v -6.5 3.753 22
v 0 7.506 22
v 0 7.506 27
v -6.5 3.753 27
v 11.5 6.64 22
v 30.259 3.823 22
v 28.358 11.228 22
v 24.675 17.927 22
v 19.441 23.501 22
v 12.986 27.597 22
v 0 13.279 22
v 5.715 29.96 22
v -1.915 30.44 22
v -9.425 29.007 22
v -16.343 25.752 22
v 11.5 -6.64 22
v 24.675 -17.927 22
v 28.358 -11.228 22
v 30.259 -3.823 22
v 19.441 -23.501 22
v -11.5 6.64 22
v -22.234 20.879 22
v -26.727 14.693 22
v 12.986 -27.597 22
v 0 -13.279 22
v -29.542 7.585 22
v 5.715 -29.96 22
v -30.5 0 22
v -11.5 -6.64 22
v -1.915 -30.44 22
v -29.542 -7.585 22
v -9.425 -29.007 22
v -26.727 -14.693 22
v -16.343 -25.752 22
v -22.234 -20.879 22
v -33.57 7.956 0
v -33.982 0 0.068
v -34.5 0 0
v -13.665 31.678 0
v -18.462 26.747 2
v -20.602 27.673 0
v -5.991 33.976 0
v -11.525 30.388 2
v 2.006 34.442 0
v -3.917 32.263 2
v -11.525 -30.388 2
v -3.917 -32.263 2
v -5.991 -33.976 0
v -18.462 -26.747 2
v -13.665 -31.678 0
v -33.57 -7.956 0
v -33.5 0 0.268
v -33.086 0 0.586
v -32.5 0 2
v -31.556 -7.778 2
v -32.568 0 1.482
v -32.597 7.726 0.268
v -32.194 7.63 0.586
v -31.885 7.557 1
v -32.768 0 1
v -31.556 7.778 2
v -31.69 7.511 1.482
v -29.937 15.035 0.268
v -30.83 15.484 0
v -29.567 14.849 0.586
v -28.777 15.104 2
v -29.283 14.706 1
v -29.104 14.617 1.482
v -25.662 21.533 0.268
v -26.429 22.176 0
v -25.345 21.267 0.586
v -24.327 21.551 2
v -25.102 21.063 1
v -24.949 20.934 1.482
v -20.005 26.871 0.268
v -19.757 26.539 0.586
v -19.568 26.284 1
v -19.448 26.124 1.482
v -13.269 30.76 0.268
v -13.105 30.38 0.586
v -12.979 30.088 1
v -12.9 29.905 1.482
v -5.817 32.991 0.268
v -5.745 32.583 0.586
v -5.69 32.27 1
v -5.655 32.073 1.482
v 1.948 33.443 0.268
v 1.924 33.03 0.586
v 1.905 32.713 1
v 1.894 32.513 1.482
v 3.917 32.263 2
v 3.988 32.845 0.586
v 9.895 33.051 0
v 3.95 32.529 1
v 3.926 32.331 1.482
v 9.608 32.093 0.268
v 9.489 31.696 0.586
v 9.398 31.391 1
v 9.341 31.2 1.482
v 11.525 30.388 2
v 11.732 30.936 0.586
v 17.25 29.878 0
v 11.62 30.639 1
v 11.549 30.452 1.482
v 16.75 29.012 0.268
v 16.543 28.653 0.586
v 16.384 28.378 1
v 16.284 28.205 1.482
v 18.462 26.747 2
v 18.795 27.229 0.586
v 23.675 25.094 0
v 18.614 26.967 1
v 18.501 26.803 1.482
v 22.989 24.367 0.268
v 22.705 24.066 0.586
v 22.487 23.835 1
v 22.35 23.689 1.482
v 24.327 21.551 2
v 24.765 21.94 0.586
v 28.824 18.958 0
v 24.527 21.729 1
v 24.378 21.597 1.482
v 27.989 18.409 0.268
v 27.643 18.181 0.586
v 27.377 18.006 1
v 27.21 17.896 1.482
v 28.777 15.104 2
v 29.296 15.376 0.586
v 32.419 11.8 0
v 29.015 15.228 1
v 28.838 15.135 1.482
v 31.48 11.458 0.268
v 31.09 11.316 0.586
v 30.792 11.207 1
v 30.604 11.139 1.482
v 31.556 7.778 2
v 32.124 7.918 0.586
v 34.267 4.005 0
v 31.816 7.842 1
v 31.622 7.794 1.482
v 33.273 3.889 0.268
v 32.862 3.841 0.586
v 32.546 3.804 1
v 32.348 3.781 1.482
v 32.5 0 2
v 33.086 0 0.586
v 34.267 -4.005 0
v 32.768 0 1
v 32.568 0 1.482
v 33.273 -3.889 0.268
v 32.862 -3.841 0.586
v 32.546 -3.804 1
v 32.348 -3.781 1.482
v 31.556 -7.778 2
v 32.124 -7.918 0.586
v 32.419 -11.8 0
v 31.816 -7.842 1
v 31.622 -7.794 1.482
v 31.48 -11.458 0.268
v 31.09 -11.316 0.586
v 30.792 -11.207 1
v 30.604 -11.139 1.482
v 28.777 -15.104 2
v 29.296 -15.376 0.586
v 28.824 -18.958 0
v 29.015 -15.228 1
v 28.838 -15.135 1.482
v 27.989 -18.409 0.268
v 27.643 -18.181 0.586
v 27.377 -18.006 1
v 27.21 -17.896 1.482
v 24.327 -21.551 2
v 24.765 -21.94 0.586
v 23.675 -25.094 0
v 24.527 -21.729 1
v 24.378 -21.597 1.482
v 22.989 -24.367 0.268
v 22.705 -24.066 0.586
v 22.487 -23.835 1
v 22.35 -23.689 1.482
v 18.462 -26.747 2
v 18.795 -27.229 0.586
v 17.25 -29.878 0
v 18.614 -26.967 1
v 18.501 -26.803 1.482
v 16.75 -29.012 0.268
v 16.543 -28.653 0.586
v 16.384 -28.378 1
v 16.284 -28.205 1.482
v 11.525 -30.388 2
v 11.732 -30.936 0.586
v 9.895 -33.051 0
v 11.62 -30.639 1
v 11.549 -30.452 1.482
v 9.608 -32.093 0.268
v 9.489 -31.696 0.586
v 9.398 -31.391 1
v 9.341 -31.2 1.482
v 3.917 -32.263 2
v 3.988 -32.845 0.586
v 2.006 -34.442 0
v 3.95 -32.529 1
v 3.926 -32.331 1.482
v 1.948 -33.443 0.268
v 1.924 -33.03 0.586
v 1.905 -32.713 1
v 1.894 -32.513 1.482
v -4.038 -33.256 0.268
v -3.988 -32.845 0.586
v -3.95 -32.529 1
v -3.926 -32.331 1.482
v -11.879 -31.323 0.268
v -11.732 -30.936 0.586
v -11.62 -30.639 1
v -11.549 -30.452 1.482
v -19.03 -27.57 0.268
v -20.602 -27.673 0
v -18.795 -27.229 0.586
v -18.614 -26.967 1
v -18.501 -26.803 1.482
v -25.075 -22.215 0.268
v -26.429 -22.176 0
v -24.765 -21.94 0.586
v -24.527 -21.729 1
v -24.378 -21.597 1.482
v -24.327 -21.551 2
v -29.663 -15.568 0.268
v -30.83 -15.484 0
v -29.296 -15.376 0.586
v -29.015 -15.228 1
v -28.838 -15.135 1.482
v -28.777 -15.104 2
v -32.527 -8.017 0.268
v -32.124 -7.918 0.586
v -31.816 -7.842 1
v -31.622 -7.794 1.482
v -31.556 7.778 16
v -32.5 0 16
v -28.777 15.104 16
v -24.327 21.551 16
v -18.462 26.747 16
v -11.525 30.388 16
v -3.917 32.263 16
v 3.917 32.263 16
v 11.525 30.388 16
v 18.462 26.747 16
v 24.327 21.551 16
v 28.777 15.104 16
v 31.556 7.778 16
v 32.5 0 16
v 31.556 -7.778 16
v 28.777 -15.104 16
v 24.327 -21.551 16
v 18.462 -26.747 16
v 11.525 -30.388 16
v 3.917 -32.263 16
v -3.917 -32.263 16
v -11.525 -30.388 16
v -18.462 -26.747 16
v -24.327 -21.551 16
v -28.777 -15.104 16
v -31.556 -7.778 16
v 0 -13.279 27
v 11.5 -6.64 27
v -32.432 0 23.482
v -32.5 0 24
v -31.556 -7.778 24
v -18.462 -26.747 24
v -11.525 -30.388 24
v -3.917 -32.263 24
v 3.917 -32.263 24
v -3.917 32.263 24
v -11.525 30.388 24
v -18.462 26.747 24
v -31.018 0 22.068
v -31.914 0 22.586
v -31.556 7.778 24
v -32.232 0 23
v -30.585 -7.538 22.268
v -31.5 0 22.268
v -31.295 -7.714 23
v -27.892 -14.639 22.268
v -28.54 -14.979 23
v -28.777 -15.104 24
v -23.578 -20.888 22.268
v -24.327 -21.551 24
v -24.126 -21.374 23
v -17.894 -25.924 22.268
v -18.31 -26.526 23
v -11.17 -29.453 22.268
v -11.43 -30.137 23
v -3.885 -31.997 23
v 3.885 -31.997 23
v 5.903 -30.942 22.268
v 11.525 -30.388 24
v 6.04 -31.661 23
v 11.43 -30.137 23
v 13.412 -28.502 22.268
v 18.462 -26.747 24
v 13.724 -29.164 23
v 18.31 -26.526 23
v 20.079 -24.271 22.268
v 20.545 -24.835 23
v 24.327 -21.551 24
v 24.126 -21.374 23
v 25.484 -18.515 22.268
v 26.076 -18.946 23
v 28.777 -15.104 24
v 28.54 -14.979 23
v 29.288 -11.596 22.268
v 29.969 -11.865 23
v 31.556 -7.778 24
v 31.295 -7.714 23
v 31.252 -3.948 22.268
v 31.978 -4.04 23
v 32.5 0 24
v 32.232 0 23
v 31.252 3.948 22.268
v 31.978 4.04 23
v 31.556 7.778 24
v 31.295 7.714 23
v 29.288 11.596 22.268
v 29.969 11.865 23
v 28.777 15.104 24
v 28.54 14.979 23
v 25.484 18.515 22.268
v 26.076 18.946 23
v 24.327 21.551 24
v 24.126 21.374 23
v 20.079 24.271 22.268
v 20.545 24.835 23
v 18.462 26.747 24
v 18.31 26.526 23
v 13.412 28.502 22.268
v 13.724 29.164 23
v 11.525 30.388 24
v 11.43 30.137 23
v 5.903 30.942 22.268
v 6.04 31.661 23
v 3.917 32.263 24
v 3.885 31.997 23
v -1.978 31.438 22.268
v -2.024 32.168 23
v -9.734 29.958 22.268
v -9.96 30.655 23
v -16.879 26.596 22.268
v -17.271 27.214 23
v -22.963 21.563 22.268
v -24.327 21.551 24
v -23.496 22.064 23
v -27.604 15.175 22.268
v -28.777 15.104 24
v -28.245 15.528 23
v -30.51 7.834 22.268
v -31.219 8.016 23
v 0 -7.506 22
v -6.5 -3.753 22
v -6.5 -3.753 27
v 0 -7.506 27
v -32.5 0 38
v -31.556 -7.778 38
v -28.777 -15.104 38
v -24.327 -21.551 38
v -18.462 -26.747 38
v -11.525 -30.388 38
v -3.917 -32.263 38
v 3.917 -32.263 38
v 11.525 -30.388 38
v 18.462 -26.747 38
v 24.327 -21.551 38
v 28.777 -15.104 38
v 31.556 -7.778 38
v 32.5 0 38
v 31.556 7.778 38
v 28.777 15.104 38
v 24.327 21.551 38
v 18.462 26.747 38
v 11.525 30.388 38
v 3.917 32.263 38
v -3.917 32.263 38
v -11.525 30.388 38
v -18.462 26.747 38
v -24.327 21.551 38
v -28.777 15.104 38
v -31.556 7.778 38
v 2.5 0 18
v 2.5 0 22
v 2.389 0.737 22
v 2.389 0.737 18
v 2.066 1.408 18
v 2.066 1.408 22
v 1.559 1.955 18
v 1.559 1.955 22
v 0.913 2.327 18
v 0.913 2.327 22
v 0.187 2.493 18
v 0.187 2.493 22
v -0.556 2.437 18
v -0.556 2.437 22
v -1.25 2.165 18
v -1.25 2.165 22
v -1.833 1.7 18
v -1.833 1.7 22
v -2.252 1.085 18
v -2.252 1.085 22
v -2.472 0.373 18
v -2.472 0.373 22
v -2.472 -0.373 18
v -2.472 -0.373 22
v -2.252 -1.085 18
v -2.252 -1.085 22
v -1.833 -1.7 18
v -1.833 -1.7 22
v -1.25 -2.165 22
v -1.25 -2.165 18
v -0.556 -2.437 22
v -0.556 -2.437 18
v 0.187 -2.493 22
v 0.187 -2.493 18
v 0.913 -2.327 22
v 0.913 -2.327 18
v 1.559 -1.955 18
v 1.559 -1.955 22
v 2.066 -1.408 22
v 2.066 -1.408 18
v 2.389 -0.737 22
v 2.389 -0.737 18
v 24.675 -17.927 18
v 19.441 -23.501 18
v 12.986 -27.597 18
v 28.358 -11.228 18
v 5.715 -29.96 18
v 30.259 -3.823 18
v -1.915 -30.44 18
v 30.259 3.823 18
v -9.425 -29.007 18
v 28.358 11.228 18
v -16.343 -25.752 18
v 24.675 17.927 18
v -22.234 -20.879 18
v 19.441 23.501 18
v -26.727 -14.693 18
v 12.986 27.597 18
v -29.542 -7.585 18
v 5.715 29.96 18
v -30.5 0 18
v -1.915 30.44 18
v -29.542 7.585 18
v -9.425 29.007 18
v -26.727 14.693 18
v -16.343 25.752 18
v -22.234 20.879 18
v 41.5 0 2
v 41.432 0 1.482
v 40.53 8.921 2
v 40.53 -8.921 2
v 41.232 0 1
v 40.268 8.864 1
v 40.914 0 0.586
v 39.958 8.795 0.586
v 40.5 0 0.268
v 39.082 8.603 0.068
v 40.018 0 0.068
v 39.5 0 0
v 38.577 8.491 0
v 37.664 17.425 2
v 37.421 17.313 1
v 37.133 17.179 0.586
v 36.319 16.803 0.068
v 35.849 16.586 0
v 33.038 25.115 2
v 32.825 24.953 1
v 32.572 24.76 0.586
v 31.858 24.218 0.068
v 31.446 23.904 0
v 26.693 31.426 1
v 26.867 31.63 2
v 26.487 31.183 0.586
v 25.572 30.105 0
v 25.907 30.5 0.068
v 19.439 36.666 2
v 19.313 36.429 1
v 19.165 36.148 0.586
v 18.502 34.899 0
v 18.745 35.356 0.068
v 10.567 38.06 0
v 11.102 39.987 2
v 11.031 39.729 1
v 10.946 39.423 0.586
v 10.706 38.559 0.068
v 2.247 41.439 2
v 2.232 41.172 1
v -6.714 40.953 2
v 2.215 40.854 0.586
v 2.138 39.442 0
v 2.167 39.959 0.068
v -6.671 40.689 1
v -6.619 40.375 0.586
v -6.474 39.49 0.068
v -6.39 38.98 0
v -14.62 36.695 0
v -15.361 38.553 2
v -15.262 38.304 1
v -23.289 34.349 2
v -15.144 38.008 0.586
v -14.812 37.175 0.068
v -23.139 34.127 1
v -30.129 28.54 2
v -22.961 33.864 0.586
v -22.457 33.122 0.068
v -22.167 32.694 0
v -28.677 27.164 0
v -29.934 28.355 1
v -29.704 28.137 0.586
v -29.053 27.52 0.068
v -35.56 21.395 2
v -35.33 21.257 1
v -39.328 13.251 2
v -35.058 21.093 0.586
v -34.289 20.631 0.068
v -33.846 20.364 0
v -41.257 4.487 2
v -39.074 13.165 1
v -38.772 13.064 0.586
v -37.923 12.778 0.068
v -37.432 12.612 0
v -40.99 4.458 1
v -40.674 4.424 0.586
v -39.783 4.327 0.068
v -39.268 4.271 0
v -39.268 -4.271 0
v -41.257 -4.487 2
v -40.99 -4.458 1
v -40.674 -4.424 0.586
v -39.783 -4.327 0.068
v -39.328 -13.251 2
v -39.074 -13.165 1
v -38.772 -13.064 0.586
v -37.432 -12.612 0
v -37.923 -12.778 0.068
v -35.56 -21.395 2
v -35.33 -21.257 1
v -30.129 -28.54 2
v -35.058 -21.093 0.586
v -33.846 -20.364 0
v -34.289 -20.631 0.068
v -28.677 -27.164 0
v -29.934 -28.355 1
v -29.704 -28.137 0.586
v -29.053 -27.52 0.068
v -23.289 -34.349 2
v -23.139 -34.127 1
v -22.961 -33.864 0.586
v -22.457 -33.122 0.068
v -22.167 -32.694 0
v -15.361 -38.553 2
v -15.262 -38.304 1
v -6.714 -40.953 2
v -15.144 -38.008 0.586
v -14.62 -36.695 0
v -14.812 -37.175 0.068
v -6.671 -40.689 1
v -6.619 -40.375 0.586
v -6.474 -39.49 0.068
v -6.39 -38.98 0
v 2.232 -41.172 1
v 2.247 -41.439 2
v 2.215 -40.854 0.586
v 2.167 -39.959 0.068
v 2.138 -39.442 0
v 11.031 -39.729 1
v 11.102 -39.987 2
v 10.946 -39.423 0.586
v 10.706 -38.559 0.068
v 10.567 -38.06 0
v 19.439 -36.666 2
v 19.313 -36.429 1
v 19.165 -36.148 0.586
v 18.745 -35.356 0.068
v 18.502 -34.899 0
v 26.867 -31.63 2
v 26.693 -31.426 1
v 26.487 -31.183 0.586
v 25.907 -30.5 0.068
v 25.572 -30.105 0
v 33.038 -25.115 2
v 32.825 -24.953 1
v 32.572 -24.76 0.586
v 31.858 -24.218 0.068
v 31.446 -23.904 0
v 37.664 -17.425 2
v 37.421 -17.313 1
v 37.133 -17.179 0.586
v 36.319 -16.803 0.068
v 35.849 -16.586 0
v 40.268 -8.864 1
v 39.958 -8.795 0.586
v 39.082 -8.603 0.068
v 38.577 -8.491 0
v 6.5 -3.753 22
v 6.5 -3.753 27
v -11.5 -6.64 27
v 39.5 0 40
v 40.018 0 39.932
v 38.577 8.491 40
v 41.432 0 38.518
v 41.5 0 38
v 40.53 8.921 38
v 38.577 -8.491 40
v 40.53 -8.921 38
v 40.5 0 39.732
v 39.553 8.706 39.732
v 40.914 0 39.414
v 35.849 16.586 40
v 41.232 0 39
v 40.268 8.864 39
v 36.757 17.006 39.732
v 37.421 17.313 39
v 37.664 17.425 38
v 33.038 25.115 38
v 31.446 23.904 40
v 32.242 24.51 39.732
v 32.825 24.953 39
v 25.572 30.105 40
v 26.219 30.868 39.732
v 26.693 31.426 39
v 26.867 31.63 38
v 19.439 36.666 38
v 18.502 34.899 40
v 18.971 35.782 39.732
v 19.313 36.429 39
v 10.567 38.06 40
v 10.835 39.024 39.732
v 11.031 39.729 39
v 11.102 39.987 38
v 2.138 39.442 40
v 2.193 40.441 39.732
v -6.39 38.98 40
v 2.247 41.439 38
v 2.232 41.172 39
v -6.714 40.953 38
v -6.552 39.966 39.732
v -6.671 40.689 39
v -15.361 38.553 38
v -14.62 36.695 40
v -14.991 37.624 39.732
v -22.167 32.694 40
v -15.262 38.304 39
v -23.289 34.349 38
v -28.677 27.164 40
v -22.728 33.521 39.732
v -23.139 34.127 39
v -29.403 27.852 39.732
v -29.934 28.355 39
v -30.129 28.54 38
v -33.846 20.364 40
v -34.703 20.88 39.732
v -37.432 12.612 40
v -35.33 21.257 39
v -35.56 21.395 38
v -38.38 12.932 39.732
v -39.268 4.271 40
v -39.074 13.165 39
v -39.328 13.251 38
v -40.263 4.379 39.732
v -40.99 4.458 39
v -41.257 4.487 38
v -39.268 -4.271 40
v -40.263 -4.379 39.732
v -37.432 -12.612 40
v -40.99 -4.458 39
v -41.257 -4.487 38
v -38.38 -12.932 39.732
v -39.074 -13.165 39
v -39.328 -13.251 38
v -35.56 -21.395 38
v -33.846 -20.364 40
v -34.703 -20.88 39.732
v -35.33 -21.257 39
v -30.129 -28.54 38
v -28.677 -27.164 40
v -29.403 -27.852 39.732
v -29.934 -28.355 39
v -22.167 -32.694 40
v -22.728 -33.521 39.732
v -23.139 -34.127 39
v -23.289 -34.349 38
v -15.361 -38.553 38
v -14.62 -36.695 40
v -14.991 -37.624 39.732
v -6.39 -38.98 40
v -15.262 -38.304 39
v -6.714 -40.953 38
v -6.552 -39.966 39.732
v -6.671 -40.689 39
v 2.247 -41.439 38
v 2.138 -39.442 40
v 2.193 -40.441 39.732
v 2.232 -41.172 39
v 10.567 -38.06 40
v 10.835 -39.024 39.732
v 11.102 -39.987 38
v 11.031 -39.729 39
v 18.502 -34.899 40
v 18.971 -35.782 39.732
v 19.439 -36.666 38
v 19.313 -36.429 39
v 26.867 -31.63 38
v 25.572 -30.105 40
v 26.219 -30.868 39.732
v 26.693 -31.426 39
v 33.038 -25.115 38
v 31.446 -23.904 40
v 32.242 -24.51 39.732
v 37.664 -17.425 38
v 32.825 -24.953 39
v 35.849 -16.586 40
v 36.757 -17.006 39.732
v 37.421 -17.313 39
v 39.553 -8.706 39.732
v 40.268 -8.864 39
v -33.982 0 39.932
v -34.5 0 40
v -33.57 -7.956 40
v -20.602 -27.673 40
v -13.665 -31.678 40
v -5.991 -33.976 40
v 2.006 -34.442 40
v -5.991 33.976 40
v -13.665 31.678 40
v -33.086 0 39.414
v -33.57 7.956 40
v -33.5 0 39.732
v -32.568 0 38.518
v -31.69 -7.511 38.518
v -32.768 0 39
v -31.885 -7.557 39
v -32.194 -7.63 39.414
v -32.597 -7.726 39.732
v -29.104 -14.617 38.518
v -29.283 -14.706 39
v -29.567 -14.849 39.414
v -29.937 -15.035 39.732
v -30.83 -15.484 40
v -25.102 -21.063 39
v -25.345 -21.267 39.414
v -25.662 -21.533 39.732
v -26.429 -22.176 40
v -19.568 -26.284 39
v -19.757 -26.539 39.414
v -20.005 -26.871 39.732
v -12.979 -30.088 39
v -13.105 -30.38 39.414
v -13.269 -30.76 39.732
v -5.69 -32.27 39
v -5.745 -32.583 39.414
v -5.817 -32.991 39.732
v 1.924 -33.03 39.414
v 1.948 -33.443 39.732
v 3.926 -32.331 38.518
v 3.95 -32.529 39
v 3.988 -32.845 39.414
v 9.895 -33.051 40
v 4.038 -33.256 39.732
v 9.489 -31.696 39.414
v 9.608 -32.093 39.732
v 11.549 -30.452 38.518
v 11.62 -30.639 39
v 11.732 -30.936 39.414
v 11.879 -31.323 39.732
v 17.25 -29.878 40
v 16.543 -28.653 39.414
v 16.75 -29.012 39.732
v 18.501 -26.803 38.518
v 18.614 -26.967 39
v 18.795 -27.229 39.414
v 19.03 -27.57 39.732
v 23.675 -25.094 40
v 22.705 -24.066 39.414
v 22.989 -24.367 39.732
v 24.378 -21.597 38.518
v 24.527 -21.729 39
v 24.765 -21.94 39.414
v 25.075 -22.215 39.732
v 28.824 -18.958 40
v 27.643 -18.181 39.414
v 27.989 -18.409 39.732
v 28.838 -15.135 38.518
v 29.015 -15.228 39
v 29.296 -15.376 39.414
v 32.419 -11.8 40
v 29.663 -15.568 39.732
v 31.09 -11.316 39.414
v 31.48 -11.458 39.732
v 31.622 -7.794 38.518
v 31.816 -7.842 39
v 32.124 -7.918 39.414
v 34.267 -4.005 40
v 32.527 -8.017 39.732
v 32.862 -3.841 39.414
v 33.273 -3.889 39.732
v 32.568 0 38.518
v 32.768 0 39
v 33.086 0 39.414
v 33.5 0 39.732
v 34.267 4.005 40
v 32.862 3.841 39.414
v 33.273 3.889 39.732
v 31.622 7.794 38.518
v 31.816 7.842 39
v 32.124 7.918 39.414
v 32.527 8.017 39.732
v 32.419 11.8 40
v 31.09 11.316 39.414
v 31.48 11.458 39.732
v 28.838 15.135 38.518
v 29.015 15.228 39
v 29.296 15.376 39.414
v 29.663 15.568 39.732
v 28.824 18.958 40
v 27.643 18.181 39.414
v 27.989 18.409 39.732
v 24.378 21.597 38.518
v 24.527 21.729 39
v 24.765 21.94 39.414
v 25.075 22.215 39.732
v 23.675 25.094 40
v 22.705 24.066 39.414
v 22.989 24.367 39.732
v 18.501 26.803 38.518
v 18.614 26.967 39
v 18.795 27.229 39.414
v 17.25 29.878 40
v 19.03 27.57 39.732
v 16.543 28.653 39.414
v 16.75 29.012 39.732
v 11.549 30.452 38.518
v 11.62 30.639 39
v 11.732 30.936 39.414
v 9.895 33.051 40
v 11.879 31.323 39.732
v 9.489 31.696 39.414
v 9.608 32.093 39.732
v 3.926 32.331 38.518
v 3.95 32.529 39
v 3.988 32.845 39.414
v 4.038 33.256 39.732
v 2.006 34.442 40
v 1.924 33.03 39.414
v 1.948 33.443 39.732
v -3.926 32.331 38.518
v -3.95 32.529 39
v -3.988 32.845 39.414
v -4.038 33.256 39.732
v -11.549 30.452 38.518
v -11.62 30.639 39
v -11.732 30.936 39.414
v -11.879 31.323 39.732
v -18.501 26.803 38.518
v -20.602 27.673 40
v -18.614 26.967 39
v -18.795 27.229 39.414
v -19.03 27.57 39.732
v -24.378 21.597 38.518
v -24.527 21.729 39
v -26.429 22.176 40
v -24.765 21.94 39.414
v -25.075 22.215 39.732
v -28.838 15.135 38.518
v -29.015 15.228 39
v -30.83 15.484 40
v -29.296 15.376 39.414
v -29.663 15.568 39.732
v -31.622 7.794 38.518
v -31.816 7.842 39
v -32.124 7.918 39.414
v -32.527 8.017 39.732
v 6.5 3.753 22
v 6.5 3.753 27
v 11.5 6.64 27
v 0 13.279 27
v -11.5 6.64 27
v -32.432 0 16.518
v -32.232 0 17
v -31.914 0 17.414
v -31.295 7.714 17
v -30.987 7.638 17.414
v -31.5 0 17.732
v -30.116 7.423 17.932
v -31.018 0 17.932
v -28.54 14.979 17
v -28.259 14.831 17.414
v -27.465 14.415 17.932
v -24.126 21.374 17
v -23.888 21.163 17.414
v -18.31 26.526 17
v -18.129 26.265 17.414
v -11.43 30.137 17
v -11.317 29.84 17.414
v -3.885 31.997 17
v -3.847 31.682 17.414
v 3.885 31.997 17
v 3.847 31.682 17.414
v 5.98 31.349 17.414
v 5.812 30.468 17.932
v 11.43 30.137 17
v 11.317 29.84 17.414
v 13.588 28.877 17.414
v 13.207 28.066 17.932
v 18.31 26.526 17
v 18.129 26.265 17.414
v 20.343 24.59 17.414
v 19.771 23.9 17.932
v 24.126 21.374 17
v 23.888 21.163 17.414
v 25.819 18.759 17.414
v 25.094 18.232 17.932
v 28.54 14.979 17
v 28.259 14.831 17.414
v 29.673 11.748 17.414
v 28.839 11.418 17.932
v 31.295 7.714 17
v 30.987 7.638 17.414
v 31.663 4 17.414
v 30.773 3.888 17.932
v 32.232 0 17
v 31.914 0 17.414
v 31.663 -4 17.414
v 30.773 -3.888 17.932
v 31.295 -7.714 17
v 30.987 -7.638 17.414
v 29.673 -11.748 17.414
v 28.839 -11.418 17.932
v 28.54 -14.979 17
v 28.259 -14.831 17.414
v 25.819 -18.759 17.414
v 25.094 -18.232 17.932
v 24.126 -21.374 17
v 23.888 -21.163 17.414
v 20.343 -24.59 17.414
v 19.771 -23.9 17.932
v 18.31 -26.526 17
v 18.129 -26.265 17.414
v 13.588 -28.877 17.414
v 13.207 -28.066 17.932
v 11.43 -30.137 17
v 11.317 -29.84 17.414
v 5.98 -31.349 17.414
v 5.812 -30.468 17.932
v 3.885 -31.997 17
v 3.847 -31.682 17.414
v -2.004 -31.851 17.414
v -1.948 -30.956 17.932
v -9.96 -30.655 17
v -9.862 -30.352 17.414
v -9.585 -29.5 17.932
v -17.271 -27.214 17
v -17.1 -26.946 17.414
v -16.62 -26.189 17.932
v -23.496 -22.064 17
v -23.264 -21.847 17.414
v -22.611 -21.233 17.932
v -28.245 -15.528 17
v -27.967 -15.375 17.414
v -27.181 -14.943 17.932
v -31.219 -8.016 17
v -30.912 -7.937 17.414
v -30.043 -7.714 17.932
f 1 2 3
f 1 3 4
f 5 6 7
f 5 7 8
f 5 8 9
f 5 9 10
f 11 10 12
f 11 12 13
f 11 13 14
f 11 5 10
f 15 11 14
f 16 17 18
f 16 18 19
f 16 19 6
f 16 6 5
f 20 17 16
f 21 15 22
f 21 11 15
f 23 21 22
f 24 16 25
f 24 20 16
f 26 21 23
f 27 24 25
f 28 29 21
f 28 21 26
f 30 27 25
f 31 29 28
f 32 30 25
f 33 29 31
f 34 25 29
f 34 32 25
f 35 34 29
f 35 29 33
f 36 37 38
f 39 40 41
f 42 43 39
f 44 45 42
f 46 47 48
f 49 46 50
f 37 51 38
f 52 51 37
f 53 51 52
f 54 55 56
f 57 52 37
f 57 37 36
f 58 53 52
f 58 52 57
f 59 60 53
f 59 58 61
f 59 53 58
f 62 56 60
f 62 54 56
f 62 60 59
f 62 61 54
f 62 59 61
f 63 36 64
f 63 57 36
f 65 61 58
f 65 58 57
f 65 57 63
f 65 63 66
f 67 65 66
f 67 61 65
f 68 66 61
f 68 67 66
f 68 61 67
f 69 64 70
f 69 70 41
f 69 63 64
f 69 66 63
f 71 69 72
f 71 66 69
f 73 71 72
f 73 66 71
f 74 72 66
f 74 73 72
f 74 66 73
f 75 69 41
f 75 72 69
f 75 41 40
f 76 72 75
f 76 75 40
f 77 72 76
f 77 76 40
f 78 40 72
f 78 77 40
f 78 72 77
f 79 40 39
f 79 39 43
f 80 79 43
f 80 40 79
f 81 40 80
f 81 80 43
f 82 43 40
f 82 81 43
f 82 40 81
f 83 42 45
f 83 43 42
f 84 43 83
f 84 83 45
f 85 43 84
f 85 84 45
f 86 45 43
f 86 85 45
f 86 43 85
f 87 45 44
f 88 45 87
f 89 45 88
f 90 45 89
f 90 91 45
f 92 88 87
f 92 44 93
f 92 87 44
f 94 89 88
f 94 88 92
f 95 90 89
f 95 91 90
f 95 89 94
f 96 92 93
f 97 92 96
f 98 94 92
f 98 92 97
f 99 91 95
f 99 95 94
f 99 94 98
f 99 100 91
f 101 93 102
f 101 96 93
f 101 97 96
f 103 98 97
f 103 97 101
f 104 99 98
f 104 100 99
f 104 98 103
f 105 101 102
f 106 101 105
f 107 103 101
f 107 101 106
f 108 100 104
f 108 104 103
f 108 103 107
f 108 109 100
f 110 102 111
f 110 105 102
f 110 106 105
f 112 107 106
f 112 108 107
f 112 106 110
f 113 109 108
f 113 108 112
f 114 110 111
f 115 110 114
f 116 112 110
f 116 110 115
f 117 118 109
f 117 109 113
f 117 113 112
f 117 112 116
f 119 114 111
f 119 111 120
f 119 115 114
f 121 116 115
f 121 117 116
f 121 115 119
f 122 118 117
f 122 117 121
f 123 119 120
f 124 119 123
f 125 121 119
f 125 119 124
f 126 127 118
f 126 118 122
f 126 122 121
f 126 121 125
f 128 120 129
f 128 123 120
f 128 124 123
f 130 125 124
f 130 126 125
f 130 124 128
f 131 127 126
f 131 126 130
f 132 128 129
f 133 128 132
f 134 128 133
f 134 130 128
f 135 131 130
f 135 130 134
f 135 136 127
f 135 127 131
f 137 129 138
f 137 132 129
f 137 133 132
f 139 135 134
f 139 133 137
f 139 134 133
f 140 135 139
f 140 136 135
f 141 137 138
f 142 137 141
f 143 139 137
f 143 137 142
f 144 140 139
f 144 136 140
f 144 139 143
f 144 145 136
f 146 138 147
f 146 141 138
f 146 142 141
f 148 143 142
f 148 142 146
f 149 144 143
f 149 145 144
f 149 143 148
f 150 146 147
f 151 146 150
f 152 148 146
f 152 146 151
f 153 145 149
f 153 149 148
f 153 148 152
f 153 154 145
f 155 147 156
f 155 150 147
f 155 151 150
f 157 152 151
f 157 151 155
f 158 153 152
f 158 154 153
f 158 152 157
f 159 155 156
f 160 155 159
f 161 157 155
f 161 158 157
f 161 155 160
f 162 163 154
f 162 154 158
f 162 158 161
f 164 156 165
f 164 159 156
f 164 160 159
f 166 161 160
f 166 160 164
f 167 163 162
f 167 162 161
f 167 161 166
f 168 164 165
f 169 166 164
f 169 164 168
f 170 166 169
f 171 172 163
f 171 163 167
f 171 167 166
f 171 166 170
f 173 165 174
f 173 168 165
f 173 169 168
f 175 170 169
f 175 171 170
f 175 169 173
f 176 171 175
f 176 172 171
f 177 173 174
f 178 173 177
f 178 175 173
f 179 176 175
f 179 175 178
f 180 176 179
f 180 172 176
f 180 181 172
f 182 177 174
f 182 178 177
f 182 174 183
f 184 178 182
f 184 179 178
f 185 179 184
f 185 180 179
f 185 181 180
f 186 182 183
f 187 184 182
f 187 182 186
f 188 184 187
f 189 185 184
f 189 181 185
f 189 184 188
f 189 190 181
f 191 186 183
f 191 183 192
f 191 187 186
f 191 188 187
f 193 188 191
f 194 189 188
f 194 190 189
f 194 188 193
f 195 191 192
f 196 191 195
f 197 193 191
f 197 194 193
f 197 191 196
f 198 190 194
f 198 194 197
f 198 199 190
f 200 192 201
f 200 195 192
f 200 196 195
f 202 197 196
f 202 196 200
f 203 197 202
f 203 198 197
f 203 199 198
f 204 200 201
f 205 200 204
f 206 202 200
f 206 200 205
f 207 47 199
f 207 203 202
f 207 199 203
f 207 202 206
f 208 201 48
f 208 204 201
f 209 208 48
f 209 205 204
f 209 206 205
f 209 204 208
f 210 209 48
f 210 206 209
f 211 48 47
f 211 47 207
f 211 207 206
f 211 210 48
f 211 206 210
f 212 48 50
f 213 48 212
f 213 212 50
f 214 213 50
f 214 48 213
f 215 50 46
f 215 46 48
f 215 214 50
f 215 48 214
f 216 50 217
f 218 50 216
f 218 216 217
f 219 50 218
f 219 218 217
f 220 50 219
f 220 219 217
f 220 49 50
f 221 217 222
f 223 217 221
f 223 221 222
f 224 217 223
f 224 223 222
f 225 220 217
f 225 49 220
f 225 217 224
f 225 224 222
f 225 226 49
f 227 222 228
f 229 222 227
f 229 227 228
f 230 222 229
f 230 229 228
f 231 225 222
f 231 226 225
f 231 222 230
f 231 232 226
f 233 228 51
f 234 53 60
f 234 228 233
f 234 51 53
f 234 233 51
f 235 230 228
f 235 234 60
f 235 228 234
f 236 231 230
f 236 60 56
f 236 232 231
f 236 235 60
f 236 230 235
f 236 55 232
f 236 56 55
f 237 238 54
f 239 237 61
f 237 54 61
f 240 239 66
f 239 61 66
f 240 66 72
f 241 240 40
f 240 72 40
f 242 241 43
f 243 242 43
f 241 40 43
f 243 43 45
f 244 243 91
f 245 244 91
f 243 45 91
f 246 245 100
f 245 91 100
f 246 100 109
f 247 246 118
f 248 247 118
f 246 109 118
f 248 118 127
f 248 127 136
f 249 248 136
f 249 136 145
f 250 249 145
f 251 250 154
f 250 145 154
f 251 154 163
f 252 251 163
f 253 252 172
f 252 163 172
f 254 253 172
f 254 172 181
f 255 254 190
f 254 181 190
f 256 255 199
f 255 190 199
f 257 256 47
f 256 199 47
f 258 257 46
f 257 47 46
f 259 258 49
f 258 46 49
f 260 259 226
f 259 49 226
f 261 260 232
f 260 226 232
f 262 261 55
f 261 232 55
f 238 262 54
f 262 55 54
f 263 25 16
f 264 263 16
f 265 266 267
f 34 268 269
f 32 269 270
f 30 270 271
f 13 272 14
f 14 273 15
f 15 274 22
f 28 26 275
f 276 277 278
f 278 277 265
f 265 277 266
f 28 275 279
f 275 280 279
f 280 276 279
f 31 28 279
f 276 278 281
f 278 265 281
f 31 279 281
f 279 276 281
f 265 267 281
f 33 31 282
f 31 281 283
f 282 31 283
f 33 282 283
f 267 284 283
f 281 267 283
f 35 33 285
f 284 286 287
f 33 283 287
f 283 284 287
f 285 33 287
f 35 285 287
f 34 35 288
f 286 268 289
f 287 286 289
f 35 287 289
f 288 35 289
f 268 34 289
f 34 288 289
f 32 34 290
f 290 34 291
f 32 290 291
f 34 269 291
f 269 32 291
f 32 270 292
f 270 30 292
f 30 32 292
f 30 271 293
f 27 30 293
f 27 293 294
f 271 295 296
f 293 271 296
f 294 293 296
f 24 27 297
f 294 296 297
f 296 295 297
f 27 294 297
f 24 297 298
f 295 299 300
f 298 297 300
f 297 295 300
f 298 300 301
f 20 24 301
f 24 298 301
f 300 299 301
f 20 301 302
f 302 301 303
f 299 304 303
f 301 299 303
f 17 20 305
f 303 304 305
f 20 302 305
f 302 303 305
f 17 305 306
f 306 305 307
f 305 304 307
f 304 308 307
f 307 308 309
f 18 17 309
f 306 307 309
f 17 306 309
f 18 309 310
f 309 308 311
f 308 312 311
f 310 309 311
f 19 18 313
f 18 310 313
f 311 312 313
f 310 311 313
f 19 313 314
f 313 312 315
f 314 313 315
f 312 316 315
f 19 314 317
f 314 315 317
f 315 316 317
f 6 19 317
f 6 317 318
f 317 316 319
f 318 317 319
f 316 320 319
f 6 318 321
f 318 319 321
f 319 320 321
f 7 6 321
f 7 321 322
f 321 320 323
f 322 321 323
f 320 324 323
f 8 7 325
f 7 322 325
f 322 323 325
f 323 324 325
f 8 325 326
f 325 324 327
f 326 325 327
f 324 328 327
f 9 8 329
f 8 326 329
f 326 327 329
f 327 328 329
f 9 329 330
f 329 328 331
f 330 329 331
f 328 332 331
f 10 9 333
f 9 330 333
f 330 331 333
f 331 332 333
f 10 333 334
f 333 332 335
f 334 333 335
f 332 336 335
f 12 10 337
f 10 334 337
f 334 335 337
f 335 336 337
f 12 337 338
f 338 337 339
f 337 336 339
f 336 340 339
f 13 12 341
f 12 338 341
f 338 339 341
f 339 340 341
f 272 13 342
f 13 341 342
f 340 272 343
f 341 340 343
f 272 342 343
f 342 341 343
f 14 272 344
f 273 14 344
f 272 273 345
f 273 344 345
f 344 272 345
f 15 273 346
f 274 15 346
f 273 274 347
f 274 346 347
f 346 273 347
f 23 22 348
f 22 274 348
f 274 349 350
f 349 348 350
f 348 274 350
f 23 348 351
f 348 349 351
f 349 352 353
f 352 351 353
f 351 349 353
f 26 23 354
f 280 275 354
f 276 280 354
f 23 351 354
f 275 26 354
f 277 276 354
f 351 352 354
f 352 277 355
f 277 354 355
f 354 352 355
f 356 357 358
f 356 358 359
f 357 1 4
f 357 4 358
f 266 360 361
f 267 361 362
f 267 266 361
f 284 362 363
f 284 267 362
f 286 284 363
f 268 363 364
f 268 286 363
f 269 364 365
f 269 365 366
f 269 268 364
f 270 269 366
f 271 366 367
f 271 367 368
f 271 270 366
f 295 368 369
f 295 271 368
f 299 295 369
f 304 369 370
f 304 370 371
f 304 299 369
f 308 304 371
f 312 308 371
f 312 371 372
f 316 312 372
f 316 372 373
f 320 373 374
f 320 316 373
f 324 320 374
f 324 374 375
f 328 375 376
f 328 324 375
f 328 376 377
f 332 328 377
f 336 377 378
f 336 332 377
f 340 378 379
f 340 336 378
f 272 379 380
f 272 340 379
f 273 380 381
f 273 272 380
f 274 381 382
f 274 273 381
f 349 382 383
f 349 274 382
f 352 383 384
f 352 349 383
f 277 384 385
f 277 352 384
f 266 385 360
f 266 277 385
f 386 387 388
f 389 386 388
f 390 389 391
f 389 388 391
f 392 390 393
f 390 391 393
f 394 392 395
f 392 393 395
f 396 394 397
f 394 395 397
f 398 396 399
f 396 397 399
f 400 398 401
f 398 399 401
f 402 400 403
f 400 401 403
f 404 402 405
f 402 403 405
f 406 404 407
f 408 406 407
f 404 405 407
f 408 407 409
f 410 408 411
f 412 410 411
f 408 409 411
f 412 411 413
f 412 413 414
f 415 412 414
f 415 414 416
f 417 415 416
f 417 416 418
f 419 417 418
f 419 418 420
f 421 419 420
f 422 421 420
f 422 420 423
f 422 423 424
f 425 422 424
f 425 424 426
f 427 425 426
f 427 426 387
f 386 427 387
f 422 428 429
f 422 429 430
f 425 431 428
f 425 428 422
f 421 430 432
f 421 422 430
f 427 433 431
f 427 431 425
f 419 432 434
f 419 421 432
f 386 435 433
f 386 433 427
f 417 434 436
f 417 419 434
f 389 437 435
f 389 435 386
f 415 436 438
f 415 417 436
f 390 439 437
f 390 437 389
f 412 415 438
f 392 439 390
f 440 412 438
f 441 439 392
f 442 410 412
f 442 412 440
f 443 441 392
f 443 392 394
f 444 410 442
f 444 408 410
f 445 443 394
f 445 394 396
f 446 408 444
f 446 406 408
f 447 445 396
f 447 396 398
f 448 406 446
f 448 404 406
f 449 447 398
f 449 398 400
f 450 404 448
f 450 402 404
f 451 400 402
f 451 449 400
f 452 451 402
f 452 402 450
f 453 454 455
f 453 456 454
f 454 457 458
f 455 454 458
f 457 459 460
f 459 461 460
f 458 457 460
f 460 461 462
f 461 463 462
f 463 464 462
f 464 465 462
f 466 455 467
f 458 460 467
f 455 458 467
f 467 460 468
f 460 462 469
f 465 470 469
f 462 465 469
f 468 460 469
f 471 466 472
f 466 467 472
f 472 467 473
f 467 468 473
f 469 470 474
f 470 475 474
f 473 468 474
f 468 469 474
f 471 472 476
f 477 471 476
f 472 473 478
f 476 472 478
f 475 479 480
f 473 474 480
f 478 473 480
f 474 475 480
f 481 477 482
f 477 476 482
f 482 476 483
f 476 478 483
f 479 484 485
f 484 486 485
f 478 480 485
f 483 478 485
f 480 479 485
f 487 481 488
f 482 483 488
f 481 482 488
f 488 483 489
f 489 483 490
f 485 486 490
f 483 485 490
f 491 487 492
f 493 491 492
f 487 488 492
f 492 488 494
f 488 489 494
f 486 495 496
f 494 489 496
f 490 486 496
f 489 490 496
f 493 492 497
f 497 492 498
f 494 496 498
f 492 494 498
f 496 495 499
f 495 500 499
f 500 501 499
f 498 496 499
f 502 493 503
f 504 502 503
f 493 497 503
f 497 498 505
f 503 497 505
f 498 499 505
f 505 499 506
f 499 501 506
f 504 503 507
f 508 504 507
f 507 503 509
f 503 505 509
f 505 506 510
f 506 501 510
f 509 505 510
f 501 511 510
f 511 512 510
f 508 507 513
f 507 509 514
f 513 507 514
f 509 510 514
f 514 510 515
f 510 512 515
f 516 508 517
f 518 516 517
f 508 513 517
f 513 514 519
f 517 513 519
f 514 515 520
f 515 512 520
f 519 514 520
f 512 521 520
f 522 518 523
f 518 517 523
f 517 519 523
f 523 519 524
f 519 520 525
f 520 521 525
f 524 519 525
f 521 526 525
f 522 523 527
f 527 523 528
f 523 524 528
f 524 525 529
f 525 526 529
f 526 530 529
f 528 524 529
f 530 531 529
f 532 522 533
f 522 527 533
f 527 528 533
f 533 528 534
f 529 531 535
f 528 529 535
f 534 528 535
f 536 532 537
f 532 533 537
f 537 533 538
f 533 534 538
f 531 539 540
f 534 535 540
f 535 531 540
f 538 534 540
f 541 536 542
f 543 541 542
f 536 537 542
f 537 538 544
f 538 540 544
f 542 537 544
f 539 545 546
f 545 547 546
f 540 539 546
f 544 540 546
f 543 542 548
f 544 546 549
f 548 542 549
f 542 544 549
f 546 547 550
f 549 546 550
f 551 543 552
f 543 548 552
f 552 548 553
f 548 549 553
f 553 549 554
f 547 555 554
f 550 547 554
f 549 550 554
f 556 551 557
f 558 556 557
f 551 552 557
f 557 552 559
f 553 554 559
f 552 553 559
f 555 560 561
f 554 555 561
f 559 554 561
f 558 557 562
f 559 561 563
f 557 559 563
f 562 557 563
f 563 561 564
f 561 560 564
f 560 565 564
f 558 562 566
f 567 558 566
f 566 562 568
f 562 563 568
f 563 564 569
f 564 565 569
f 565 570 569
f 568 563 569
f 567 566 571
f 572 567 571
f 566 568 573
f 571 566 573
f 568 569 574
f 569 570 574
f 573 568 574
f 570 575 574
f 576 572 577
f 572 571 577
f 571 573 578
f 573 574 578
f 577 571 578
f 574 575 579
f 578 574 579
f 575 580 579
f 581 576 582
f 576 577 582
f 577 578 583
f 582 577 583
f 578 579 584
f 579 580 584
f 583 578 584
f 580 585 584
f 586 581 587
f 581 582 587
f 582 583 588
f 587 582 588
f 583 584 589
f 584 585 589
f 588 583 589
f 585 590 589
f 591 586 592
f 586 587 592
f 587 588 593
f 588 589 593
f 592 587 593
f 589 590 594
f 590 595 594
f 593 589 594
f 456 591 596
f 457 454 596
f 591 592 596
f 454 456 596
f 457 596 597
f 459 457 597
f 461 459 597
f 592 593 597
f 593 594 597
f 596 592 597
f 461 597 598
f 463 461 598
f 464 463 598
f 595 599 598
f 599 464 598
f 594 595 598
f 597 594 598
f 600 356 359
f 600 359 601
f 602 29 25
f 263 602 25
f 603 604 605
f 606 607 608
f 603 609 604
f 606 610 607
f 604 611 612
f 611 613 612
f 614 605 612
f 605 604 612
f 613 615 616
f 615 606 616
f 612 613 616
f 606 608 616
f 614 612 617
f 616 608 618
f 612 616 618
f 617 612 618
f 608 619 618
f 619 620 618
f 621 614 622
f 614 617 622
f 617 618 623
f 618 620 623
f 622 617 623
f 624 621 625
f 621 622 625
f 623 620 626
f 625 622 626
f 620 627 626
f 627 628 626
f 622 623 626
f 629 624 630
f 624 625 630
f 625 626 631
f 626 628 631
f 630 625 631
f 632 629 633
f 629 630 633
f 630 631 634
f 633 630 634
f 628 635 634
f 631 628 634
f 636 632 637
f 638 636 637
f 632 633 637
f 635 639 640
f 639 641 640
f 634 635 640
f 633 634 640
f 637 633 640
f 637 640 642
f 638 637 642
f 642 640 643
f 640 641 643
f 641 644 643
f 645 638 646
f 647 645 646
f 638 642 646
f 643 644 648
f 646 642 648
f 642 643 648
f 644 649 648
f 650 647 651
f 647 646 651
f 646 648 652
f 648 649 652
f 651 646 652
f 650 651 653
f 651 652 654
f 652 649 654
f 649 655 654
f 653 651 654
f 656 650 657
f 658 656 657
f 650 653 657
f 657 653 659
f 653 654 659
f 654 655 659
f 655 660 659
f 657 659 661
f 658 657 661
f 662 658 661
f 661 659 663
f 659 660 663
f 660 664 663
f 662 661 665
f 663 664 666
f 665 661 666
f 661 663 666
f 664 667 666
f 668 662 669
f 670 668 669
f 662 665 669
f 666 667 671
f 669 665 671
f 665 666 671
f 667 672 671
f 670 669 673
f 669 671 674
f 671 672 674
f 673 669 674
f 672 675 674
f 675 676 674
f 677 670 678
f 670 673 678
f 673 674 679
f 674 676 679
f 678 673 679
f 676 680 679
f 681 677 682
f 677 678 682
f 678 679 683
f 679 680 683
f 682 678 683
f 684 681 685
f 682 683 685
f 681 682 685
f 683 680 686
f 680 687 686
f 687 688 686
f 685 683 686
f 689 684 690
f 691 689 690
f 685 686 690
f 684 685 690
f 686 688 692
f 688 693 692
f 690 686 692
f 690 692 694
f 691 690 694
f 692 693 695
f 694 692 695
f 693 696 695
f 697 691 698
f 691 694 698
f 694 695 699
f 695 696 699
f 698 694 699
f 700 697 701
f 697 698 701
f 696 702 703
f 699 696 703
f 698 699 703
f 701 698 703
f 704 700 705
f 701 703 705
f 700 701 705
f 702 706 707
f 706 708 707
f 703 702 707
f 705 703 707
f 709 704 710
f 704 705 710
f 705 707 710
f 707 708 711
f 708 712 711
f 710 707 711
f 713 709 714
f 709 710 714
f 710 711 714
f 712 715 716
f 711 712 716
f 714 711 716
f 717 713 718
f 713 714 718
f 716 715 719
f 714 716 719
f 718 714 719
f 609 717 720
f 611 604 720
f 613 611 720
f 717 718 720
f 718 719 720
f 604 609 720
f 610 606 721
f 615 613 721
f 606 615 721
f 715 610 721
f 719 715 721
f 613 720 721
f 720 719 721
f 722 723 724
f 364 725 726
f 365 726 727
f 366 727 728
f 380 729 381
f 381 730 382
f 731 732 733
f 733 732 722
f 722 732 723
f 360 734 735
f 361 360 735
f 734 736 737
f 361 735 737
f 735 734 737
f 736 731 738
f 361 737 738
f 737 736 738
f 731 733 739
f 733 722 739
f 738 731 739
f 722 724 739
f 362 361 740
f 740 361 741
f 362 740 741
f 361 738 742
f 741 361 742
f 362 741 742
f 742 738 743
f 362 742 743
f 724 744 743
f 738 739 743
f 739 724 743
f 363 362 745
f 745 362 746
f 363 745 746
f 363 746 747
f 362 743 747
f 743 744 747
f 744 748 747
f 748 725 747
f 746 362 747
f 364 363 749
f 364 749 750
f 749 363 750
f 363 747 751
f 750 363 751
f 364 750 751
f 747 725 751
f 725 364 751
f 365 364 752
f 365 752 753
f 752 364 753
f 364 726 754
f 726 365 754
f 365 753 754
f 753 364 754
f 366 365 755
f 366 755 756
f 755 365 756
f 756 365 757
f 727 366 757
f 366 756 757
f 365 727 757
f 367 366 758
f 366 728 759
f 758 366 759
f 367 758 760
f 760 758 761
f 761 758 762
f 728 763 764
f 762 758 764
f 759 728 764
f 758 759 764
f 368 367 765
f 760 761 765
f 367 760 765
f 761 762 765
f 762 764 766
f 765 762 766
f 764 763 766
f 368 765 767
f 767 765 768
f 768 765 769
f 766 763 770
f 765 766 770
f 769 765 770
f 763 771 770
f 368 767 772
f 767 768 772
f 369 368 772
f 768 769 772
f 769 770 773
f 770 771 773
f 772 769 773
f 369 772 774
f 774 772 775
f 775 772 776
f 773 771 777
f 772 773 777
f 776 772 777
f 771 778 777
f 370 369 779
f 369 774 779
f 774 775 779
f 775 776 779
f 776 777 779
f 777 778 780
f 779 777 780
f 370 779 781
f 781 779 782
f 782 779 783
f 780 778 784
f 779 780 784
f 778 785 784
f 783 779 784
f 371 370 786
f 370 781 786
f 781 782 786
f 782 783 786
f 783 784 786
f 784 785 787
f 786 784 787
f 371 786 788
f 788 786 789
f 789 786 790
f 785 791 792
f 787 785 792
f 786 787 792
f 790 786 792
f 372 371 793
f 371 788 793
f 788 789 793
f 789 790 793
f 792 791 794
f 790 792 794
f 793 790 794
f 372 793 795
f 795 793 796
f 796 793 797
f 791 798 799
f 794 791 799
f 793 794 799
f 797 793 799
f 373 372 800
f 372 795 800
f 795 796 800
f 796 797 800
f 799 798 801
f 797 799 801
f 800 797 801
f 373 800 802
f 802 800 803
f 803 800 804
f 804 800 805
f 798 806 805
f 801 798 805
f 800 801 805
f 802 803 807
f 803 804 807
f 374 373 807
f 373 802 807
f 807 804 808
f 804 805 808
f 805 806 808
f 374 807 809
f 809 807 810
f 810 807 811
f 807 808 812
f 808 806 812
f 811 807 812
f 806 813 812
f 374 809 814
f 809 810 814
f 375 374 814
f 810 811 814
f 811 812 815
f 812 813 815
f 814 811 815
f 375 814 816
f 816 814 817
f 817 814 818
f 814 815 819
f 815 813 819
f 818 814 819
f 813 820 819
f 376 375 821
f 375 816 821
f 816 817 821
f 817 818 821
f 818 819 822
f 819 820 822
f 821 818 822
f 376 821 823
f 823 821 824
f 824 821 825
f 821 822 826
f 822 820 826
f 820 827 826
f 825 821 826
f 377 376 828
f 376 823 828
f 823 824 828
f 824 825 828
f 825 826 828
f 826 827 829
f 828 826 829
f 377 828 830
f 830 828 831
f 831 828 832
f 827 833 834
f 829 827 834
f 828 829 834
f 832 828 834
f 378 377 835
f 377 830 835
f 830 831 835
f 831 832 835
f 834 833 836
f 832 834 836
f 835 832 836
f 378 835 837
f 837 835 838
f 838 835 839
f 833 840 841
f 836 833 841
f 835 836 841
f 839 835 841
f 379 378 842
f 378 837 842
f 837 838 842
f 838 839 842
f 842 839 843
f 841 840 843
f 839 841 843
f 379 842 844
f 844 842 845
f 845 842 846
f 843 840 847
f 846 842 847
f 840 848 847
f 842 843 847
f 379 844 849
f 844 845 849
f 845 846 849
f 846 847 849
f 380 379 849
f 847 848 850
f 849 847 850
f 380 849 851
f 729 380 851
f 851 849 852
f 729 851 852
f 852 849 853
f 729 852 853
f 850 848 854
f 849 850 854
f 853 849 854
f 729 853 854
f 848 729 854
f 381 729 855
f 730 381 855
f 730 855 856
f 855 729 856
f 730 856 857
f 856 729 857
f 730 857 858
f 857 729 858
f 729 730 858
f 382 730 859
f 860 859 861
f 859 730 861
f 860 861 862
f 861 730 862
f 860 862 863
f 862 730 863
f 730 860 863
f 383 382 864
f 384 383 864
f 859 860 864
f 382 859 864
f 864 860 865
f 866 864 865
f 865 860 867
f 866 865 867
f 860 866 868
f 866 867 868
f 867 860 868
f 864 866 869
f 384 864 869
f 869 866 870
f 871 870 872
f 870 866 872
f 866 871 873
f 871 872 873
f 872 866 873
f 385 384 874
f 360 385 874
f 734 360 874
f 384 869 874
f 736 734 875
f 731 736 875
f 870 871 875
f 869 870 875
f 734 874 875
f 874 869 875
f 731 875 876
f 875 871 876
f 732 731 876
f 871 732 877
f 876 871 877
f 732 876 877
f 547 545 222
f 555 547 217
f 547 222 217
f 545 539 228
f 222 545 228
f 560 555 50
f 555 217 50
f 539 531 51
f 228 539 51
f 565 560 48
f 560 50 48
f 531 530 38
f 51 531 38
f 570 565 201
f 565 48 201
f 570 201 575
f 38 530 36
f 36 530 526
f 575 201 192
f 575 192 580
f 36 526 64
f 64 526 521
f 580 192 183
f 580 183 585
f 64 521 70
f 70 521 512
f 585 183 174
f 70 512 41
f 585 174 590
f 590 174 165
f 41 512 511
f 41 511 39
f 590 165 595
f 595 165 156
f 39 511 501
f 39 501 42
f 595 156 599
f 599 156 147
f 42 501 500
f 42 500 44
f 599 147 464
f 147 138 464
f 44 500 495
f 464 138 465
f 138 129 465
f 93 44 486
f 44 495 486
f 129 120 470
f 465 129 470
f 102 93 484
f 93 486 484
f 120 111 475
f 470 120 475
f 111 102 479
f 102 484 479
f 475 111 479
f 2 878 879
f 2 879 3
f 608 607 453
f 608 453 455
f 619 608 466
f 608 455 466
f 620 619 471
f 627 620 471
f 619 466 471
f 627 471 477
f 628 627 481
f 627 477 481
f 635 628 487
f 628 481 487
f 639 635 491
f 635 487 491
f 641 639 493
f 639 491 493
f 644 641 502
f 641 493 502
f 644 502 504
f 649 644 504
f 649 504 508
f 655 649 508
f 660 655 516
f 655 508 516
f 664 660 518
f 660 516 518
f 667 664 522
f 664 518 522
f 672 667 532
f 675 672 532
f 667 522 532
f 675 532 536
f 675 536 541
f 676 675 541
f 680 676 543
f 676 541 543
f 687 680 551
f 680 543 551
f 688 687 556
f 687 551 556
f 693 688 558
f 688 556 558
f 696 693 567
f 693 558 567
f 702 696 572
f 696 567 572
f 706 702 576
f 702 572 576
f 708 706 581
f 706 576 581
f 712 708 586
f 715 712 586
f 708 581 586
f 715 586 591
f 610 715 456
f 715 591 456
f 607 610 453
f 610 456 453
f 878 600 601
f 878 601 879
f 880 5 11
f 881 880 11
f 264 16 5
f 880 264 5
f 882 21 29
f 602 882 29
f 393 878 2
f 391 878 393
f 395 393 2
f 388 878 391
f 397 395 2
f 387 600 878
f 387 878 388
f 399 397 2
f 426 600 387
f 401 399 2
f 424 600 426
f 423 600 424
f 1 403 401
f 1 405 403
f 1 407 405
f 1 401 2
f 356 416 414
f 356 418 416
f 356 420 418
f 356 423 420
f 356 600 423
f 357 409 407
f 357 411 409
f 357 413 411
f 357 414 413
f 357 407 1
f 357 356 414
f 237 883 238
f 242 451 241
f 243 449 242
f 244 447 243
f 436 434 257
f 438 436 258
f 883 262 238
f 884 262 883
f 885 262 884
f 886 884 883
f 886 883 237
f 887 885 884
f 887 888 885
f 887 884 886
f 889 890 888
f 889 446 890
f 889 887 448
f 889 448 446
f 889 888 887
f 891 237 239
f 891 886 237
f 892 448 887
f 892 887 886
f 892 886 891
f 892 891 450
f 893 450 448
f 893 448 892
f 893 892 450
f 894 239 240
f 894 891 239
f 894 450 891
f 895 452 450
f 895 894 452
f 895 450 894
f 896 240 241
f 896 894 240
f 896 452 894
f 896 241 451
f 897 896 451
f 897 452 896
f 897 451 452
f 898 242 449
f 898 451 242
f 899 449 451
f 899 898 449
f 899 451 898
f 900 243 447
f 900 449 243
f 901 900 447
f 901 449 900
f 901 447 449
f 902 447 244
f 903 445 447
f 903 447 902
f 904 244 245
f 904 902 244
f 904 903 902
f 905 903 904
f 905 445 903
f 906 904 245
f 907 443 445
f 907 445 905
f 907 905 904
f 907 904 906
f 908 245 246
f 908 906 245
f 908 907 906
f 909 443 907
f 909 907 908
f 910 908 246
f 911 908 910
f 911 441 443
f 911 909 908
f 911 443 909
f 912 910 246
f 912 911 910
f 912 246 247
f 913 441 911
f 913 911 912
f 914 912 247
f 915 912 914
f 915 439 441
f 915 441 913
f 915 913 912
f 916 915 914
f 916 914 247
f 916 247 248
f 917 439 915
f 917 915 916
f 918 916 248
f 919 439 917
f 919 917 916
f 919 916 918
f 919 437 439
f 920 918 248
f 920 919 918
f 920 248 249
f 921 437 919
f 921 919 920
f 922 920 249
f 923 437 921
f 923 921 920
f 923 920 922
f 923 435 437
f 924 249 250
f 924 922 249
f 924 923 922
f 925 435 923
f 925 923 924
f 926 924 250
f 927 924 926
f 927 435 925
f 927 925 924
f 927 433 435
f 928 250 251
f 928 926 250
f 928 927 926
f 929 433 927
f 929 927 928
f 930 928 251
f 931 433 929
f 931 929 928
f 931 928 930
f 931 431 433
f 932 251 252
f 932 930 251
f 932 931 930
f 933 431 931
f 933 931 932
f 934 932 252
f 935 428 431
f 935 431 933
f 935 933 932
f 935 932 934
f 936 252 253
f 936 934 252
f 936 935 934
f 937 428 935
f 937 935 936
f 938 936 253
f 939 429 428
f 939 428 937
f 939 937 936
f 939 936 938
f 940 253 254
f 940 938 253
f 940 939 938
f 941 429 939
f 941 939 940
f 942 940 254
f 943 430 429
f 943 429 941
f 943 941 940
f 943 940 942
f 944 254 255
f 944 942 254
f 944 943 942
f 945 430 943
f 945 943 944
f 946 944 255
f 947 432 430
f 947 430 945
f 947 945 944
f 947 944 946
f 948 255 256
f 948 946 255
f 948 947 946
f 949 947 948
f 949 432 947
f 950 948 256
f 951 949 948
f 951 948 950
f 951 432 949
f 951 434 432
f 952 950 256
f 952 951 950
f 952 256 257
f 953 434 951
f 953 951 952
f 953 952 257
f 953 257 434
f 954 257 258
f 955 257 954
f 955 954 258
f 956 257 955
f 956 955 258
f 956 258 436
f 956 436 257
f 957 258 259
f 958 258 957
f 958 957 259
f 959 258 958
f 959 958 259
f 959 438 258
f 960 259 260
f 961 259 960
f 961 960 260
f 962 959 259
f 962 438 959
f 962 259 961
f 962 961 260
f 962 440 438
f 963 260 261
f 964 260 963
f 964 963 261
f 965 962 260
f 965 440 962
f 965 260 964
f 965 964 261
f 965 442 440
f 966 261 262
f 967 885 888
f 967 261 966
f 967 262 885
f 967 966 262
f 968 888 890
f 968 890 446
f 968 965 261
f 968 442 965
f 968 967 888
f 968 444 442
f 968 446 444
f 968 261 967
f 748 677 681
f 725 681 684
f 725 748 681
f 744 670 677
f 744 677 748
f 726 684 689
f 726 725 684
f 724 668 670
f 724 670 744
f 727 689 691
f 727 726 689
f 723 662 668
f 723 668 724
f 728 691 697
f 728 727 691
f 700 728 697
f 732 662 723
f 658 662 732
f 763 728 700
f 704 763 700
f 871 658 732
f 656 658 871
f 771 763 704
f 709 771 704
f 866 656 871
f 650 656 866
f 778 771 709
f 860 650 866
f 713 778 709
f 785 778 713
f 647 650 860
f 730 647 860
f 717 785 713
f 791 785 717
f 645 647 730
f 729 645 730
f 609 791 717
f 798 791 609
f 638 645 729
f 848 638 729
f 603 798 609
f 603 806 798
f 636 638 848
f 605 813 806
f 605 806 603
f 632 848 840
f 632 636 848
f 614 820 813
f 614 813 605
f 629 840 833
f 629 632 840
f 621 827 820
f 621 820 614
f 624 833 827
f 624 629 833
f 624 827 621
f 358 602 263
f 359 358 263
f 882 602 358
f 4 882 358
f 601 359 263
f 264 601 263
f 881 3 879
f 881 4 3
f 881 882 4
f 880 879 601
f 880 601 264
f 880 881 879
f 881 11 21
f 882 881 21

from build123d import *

# Parameters (mm, degrees)
SKETCH1_R           = 41.5
BOSS_EXTRUDE1_DEPTH = 40
SKETCH2_R           = 2.5
CUT_EXTRUDE1_DEPTH  = 72.024643611
SKETCH4_R           = 32.5
CUT_EXTRUDE2_DEPTH  = 18
CUT_EXTRUDE3_START  = -18
SKETCH5_R           = 32.5
CUT_EXTRUDE3_DEPTH  = 18
BOSS_EXTRUDE2_START = 5
SKETCH6_R           = 2.5
BOSS_EXTRUDE2_DEPTH = 5
BOSS_EXTRUDE3_START = 17
SKETCH7_R           = 5.75
SKETCH7_R_2         = 2.5
BOSS_EXTRUDE3_DEPTH = 17
FILLET3_R           = 2
BOSS_EXTRUDE4_DEPTH = 5
CUT_EXTRUDE4_DEPTH  = 22


with BuildPart() as part:
    # Sketch1 → Boss-Extrude1 (new body)
    with BuildSketch(Plane.XY):
        Circle(SKETCH1_R)
    extrude(amount=BOSS_EXTRUDE1_DEPTH)

    # Sketch2 → Cut-Extrude1 (cut, through all)
    with BuildSketch(Plane.XY.offset(40)):
        Circle(SKETCH2_R)
    extrude(amount=-CUT_EXTRUDE1_DEPTH, mode=Mode.SUBTRACT)

    # Sketch4 → Cut-Extrude2 (cut)
    with BuildSketch(Plane(origin=(0, 0, 0), x_dir=(-1, 0, 0), z_dir=(0, 0, -1))):
        Circle(SKETCH4_R)
    extrude(amount=-CUT_EXTRUDE2_DEPTH, mode=Mode.SUBTRACT)

    # Sketch5 → Cut-Extrude3 (cut)
    with BuildSketch(Plane.XY.offset(40).offset(CUT_EXTRUDE3_START)):
        with Locations(Location((0, 0, 0), (0, 0, 180))):
            Circle(SKETCH5_R)
    extrude(amount=CUT_EXTRUDE3_DEPTH, mode=Mode.SUBTRACT)

    # Sketch6 → Boss-Extrude2 (add)
    with BuildSketch(Plane.XY.offset(22).offset(BOSS_EXTRUDE2_START)):
        Polygon((0, 6.92820323), (-6, 3.464101615), (-6, -3.464101615), (0, -6.92820323), (6, -3.464101615), (6, 3.464101615), align=None)
        Circle(SKETCH6_R, mode=Mode.SUBTRACT)
    extrude(amount=-BOSS_EXTRUDE2_DEPTH)

    # Sketch7 → Boss-Extrude3 (add)
    with BuildSketch(Plane.XY.offset(27).offset(BOSS_EXTRUDE3_START)):
        Circle(SKETCH7_R)
        Circle(SKETCH7_R_2, mode=Mode.SUBTRACT)
    extrude(amount=-BOSS_EXTRUDE3_DEPTH)

    # Fillet3
    fillet3_edges = [part.edges().sort_by_distance(p)[0] for p in [
        (32.5, 0, 0),
        (32.5, 0, 18),
        (32.5, 0, 40),
        (32.5, 0, 22),
        (-41.5, 0, 0),
        (-41.5, 0, 40),
    ]]
    fillet(fillet3_edges, radius=FILLET3_R)

    # Sketch8 → Boss-Extrude4 (add)
    with BuildSketch(Plane.XY.offset(22)):
        Polygon((11.5, 6.639528096), (0, 13.279056191), (-11.5, 6.639528096), (-11.5, -6.639528096), (0, -13.279056191), (11.5, -6.639528096), align=None)
        Polygon((6.5, 3.75277675), (0, 7.505553499), (-6.5, 3.75277675), (-6.5, -3.75277675), (0, -7.505553499), (6.5, -3.75277675), align=None, mode=Mode.SUBTRACT)
    extrude(amount=BOSS_EXTRUDE4_DEPTH)

    # Sketch9 → Cut-Extrude4 (cut)
    with BuildSketch(Plane.XY.offset(44)):
        Polygon((0, 7.247698374), (-6.276690911, 3.623849187), (-6.276690911, -3.623849187), (0, -7.247698374), (6.276690911, -3.623849187), (6.276690911, 3.623849187), align=None)
    extrude(amount=-CUT_EXTRUDE4_DEPTH, mode=Mode.SUBTRACT)


solid = part.part
